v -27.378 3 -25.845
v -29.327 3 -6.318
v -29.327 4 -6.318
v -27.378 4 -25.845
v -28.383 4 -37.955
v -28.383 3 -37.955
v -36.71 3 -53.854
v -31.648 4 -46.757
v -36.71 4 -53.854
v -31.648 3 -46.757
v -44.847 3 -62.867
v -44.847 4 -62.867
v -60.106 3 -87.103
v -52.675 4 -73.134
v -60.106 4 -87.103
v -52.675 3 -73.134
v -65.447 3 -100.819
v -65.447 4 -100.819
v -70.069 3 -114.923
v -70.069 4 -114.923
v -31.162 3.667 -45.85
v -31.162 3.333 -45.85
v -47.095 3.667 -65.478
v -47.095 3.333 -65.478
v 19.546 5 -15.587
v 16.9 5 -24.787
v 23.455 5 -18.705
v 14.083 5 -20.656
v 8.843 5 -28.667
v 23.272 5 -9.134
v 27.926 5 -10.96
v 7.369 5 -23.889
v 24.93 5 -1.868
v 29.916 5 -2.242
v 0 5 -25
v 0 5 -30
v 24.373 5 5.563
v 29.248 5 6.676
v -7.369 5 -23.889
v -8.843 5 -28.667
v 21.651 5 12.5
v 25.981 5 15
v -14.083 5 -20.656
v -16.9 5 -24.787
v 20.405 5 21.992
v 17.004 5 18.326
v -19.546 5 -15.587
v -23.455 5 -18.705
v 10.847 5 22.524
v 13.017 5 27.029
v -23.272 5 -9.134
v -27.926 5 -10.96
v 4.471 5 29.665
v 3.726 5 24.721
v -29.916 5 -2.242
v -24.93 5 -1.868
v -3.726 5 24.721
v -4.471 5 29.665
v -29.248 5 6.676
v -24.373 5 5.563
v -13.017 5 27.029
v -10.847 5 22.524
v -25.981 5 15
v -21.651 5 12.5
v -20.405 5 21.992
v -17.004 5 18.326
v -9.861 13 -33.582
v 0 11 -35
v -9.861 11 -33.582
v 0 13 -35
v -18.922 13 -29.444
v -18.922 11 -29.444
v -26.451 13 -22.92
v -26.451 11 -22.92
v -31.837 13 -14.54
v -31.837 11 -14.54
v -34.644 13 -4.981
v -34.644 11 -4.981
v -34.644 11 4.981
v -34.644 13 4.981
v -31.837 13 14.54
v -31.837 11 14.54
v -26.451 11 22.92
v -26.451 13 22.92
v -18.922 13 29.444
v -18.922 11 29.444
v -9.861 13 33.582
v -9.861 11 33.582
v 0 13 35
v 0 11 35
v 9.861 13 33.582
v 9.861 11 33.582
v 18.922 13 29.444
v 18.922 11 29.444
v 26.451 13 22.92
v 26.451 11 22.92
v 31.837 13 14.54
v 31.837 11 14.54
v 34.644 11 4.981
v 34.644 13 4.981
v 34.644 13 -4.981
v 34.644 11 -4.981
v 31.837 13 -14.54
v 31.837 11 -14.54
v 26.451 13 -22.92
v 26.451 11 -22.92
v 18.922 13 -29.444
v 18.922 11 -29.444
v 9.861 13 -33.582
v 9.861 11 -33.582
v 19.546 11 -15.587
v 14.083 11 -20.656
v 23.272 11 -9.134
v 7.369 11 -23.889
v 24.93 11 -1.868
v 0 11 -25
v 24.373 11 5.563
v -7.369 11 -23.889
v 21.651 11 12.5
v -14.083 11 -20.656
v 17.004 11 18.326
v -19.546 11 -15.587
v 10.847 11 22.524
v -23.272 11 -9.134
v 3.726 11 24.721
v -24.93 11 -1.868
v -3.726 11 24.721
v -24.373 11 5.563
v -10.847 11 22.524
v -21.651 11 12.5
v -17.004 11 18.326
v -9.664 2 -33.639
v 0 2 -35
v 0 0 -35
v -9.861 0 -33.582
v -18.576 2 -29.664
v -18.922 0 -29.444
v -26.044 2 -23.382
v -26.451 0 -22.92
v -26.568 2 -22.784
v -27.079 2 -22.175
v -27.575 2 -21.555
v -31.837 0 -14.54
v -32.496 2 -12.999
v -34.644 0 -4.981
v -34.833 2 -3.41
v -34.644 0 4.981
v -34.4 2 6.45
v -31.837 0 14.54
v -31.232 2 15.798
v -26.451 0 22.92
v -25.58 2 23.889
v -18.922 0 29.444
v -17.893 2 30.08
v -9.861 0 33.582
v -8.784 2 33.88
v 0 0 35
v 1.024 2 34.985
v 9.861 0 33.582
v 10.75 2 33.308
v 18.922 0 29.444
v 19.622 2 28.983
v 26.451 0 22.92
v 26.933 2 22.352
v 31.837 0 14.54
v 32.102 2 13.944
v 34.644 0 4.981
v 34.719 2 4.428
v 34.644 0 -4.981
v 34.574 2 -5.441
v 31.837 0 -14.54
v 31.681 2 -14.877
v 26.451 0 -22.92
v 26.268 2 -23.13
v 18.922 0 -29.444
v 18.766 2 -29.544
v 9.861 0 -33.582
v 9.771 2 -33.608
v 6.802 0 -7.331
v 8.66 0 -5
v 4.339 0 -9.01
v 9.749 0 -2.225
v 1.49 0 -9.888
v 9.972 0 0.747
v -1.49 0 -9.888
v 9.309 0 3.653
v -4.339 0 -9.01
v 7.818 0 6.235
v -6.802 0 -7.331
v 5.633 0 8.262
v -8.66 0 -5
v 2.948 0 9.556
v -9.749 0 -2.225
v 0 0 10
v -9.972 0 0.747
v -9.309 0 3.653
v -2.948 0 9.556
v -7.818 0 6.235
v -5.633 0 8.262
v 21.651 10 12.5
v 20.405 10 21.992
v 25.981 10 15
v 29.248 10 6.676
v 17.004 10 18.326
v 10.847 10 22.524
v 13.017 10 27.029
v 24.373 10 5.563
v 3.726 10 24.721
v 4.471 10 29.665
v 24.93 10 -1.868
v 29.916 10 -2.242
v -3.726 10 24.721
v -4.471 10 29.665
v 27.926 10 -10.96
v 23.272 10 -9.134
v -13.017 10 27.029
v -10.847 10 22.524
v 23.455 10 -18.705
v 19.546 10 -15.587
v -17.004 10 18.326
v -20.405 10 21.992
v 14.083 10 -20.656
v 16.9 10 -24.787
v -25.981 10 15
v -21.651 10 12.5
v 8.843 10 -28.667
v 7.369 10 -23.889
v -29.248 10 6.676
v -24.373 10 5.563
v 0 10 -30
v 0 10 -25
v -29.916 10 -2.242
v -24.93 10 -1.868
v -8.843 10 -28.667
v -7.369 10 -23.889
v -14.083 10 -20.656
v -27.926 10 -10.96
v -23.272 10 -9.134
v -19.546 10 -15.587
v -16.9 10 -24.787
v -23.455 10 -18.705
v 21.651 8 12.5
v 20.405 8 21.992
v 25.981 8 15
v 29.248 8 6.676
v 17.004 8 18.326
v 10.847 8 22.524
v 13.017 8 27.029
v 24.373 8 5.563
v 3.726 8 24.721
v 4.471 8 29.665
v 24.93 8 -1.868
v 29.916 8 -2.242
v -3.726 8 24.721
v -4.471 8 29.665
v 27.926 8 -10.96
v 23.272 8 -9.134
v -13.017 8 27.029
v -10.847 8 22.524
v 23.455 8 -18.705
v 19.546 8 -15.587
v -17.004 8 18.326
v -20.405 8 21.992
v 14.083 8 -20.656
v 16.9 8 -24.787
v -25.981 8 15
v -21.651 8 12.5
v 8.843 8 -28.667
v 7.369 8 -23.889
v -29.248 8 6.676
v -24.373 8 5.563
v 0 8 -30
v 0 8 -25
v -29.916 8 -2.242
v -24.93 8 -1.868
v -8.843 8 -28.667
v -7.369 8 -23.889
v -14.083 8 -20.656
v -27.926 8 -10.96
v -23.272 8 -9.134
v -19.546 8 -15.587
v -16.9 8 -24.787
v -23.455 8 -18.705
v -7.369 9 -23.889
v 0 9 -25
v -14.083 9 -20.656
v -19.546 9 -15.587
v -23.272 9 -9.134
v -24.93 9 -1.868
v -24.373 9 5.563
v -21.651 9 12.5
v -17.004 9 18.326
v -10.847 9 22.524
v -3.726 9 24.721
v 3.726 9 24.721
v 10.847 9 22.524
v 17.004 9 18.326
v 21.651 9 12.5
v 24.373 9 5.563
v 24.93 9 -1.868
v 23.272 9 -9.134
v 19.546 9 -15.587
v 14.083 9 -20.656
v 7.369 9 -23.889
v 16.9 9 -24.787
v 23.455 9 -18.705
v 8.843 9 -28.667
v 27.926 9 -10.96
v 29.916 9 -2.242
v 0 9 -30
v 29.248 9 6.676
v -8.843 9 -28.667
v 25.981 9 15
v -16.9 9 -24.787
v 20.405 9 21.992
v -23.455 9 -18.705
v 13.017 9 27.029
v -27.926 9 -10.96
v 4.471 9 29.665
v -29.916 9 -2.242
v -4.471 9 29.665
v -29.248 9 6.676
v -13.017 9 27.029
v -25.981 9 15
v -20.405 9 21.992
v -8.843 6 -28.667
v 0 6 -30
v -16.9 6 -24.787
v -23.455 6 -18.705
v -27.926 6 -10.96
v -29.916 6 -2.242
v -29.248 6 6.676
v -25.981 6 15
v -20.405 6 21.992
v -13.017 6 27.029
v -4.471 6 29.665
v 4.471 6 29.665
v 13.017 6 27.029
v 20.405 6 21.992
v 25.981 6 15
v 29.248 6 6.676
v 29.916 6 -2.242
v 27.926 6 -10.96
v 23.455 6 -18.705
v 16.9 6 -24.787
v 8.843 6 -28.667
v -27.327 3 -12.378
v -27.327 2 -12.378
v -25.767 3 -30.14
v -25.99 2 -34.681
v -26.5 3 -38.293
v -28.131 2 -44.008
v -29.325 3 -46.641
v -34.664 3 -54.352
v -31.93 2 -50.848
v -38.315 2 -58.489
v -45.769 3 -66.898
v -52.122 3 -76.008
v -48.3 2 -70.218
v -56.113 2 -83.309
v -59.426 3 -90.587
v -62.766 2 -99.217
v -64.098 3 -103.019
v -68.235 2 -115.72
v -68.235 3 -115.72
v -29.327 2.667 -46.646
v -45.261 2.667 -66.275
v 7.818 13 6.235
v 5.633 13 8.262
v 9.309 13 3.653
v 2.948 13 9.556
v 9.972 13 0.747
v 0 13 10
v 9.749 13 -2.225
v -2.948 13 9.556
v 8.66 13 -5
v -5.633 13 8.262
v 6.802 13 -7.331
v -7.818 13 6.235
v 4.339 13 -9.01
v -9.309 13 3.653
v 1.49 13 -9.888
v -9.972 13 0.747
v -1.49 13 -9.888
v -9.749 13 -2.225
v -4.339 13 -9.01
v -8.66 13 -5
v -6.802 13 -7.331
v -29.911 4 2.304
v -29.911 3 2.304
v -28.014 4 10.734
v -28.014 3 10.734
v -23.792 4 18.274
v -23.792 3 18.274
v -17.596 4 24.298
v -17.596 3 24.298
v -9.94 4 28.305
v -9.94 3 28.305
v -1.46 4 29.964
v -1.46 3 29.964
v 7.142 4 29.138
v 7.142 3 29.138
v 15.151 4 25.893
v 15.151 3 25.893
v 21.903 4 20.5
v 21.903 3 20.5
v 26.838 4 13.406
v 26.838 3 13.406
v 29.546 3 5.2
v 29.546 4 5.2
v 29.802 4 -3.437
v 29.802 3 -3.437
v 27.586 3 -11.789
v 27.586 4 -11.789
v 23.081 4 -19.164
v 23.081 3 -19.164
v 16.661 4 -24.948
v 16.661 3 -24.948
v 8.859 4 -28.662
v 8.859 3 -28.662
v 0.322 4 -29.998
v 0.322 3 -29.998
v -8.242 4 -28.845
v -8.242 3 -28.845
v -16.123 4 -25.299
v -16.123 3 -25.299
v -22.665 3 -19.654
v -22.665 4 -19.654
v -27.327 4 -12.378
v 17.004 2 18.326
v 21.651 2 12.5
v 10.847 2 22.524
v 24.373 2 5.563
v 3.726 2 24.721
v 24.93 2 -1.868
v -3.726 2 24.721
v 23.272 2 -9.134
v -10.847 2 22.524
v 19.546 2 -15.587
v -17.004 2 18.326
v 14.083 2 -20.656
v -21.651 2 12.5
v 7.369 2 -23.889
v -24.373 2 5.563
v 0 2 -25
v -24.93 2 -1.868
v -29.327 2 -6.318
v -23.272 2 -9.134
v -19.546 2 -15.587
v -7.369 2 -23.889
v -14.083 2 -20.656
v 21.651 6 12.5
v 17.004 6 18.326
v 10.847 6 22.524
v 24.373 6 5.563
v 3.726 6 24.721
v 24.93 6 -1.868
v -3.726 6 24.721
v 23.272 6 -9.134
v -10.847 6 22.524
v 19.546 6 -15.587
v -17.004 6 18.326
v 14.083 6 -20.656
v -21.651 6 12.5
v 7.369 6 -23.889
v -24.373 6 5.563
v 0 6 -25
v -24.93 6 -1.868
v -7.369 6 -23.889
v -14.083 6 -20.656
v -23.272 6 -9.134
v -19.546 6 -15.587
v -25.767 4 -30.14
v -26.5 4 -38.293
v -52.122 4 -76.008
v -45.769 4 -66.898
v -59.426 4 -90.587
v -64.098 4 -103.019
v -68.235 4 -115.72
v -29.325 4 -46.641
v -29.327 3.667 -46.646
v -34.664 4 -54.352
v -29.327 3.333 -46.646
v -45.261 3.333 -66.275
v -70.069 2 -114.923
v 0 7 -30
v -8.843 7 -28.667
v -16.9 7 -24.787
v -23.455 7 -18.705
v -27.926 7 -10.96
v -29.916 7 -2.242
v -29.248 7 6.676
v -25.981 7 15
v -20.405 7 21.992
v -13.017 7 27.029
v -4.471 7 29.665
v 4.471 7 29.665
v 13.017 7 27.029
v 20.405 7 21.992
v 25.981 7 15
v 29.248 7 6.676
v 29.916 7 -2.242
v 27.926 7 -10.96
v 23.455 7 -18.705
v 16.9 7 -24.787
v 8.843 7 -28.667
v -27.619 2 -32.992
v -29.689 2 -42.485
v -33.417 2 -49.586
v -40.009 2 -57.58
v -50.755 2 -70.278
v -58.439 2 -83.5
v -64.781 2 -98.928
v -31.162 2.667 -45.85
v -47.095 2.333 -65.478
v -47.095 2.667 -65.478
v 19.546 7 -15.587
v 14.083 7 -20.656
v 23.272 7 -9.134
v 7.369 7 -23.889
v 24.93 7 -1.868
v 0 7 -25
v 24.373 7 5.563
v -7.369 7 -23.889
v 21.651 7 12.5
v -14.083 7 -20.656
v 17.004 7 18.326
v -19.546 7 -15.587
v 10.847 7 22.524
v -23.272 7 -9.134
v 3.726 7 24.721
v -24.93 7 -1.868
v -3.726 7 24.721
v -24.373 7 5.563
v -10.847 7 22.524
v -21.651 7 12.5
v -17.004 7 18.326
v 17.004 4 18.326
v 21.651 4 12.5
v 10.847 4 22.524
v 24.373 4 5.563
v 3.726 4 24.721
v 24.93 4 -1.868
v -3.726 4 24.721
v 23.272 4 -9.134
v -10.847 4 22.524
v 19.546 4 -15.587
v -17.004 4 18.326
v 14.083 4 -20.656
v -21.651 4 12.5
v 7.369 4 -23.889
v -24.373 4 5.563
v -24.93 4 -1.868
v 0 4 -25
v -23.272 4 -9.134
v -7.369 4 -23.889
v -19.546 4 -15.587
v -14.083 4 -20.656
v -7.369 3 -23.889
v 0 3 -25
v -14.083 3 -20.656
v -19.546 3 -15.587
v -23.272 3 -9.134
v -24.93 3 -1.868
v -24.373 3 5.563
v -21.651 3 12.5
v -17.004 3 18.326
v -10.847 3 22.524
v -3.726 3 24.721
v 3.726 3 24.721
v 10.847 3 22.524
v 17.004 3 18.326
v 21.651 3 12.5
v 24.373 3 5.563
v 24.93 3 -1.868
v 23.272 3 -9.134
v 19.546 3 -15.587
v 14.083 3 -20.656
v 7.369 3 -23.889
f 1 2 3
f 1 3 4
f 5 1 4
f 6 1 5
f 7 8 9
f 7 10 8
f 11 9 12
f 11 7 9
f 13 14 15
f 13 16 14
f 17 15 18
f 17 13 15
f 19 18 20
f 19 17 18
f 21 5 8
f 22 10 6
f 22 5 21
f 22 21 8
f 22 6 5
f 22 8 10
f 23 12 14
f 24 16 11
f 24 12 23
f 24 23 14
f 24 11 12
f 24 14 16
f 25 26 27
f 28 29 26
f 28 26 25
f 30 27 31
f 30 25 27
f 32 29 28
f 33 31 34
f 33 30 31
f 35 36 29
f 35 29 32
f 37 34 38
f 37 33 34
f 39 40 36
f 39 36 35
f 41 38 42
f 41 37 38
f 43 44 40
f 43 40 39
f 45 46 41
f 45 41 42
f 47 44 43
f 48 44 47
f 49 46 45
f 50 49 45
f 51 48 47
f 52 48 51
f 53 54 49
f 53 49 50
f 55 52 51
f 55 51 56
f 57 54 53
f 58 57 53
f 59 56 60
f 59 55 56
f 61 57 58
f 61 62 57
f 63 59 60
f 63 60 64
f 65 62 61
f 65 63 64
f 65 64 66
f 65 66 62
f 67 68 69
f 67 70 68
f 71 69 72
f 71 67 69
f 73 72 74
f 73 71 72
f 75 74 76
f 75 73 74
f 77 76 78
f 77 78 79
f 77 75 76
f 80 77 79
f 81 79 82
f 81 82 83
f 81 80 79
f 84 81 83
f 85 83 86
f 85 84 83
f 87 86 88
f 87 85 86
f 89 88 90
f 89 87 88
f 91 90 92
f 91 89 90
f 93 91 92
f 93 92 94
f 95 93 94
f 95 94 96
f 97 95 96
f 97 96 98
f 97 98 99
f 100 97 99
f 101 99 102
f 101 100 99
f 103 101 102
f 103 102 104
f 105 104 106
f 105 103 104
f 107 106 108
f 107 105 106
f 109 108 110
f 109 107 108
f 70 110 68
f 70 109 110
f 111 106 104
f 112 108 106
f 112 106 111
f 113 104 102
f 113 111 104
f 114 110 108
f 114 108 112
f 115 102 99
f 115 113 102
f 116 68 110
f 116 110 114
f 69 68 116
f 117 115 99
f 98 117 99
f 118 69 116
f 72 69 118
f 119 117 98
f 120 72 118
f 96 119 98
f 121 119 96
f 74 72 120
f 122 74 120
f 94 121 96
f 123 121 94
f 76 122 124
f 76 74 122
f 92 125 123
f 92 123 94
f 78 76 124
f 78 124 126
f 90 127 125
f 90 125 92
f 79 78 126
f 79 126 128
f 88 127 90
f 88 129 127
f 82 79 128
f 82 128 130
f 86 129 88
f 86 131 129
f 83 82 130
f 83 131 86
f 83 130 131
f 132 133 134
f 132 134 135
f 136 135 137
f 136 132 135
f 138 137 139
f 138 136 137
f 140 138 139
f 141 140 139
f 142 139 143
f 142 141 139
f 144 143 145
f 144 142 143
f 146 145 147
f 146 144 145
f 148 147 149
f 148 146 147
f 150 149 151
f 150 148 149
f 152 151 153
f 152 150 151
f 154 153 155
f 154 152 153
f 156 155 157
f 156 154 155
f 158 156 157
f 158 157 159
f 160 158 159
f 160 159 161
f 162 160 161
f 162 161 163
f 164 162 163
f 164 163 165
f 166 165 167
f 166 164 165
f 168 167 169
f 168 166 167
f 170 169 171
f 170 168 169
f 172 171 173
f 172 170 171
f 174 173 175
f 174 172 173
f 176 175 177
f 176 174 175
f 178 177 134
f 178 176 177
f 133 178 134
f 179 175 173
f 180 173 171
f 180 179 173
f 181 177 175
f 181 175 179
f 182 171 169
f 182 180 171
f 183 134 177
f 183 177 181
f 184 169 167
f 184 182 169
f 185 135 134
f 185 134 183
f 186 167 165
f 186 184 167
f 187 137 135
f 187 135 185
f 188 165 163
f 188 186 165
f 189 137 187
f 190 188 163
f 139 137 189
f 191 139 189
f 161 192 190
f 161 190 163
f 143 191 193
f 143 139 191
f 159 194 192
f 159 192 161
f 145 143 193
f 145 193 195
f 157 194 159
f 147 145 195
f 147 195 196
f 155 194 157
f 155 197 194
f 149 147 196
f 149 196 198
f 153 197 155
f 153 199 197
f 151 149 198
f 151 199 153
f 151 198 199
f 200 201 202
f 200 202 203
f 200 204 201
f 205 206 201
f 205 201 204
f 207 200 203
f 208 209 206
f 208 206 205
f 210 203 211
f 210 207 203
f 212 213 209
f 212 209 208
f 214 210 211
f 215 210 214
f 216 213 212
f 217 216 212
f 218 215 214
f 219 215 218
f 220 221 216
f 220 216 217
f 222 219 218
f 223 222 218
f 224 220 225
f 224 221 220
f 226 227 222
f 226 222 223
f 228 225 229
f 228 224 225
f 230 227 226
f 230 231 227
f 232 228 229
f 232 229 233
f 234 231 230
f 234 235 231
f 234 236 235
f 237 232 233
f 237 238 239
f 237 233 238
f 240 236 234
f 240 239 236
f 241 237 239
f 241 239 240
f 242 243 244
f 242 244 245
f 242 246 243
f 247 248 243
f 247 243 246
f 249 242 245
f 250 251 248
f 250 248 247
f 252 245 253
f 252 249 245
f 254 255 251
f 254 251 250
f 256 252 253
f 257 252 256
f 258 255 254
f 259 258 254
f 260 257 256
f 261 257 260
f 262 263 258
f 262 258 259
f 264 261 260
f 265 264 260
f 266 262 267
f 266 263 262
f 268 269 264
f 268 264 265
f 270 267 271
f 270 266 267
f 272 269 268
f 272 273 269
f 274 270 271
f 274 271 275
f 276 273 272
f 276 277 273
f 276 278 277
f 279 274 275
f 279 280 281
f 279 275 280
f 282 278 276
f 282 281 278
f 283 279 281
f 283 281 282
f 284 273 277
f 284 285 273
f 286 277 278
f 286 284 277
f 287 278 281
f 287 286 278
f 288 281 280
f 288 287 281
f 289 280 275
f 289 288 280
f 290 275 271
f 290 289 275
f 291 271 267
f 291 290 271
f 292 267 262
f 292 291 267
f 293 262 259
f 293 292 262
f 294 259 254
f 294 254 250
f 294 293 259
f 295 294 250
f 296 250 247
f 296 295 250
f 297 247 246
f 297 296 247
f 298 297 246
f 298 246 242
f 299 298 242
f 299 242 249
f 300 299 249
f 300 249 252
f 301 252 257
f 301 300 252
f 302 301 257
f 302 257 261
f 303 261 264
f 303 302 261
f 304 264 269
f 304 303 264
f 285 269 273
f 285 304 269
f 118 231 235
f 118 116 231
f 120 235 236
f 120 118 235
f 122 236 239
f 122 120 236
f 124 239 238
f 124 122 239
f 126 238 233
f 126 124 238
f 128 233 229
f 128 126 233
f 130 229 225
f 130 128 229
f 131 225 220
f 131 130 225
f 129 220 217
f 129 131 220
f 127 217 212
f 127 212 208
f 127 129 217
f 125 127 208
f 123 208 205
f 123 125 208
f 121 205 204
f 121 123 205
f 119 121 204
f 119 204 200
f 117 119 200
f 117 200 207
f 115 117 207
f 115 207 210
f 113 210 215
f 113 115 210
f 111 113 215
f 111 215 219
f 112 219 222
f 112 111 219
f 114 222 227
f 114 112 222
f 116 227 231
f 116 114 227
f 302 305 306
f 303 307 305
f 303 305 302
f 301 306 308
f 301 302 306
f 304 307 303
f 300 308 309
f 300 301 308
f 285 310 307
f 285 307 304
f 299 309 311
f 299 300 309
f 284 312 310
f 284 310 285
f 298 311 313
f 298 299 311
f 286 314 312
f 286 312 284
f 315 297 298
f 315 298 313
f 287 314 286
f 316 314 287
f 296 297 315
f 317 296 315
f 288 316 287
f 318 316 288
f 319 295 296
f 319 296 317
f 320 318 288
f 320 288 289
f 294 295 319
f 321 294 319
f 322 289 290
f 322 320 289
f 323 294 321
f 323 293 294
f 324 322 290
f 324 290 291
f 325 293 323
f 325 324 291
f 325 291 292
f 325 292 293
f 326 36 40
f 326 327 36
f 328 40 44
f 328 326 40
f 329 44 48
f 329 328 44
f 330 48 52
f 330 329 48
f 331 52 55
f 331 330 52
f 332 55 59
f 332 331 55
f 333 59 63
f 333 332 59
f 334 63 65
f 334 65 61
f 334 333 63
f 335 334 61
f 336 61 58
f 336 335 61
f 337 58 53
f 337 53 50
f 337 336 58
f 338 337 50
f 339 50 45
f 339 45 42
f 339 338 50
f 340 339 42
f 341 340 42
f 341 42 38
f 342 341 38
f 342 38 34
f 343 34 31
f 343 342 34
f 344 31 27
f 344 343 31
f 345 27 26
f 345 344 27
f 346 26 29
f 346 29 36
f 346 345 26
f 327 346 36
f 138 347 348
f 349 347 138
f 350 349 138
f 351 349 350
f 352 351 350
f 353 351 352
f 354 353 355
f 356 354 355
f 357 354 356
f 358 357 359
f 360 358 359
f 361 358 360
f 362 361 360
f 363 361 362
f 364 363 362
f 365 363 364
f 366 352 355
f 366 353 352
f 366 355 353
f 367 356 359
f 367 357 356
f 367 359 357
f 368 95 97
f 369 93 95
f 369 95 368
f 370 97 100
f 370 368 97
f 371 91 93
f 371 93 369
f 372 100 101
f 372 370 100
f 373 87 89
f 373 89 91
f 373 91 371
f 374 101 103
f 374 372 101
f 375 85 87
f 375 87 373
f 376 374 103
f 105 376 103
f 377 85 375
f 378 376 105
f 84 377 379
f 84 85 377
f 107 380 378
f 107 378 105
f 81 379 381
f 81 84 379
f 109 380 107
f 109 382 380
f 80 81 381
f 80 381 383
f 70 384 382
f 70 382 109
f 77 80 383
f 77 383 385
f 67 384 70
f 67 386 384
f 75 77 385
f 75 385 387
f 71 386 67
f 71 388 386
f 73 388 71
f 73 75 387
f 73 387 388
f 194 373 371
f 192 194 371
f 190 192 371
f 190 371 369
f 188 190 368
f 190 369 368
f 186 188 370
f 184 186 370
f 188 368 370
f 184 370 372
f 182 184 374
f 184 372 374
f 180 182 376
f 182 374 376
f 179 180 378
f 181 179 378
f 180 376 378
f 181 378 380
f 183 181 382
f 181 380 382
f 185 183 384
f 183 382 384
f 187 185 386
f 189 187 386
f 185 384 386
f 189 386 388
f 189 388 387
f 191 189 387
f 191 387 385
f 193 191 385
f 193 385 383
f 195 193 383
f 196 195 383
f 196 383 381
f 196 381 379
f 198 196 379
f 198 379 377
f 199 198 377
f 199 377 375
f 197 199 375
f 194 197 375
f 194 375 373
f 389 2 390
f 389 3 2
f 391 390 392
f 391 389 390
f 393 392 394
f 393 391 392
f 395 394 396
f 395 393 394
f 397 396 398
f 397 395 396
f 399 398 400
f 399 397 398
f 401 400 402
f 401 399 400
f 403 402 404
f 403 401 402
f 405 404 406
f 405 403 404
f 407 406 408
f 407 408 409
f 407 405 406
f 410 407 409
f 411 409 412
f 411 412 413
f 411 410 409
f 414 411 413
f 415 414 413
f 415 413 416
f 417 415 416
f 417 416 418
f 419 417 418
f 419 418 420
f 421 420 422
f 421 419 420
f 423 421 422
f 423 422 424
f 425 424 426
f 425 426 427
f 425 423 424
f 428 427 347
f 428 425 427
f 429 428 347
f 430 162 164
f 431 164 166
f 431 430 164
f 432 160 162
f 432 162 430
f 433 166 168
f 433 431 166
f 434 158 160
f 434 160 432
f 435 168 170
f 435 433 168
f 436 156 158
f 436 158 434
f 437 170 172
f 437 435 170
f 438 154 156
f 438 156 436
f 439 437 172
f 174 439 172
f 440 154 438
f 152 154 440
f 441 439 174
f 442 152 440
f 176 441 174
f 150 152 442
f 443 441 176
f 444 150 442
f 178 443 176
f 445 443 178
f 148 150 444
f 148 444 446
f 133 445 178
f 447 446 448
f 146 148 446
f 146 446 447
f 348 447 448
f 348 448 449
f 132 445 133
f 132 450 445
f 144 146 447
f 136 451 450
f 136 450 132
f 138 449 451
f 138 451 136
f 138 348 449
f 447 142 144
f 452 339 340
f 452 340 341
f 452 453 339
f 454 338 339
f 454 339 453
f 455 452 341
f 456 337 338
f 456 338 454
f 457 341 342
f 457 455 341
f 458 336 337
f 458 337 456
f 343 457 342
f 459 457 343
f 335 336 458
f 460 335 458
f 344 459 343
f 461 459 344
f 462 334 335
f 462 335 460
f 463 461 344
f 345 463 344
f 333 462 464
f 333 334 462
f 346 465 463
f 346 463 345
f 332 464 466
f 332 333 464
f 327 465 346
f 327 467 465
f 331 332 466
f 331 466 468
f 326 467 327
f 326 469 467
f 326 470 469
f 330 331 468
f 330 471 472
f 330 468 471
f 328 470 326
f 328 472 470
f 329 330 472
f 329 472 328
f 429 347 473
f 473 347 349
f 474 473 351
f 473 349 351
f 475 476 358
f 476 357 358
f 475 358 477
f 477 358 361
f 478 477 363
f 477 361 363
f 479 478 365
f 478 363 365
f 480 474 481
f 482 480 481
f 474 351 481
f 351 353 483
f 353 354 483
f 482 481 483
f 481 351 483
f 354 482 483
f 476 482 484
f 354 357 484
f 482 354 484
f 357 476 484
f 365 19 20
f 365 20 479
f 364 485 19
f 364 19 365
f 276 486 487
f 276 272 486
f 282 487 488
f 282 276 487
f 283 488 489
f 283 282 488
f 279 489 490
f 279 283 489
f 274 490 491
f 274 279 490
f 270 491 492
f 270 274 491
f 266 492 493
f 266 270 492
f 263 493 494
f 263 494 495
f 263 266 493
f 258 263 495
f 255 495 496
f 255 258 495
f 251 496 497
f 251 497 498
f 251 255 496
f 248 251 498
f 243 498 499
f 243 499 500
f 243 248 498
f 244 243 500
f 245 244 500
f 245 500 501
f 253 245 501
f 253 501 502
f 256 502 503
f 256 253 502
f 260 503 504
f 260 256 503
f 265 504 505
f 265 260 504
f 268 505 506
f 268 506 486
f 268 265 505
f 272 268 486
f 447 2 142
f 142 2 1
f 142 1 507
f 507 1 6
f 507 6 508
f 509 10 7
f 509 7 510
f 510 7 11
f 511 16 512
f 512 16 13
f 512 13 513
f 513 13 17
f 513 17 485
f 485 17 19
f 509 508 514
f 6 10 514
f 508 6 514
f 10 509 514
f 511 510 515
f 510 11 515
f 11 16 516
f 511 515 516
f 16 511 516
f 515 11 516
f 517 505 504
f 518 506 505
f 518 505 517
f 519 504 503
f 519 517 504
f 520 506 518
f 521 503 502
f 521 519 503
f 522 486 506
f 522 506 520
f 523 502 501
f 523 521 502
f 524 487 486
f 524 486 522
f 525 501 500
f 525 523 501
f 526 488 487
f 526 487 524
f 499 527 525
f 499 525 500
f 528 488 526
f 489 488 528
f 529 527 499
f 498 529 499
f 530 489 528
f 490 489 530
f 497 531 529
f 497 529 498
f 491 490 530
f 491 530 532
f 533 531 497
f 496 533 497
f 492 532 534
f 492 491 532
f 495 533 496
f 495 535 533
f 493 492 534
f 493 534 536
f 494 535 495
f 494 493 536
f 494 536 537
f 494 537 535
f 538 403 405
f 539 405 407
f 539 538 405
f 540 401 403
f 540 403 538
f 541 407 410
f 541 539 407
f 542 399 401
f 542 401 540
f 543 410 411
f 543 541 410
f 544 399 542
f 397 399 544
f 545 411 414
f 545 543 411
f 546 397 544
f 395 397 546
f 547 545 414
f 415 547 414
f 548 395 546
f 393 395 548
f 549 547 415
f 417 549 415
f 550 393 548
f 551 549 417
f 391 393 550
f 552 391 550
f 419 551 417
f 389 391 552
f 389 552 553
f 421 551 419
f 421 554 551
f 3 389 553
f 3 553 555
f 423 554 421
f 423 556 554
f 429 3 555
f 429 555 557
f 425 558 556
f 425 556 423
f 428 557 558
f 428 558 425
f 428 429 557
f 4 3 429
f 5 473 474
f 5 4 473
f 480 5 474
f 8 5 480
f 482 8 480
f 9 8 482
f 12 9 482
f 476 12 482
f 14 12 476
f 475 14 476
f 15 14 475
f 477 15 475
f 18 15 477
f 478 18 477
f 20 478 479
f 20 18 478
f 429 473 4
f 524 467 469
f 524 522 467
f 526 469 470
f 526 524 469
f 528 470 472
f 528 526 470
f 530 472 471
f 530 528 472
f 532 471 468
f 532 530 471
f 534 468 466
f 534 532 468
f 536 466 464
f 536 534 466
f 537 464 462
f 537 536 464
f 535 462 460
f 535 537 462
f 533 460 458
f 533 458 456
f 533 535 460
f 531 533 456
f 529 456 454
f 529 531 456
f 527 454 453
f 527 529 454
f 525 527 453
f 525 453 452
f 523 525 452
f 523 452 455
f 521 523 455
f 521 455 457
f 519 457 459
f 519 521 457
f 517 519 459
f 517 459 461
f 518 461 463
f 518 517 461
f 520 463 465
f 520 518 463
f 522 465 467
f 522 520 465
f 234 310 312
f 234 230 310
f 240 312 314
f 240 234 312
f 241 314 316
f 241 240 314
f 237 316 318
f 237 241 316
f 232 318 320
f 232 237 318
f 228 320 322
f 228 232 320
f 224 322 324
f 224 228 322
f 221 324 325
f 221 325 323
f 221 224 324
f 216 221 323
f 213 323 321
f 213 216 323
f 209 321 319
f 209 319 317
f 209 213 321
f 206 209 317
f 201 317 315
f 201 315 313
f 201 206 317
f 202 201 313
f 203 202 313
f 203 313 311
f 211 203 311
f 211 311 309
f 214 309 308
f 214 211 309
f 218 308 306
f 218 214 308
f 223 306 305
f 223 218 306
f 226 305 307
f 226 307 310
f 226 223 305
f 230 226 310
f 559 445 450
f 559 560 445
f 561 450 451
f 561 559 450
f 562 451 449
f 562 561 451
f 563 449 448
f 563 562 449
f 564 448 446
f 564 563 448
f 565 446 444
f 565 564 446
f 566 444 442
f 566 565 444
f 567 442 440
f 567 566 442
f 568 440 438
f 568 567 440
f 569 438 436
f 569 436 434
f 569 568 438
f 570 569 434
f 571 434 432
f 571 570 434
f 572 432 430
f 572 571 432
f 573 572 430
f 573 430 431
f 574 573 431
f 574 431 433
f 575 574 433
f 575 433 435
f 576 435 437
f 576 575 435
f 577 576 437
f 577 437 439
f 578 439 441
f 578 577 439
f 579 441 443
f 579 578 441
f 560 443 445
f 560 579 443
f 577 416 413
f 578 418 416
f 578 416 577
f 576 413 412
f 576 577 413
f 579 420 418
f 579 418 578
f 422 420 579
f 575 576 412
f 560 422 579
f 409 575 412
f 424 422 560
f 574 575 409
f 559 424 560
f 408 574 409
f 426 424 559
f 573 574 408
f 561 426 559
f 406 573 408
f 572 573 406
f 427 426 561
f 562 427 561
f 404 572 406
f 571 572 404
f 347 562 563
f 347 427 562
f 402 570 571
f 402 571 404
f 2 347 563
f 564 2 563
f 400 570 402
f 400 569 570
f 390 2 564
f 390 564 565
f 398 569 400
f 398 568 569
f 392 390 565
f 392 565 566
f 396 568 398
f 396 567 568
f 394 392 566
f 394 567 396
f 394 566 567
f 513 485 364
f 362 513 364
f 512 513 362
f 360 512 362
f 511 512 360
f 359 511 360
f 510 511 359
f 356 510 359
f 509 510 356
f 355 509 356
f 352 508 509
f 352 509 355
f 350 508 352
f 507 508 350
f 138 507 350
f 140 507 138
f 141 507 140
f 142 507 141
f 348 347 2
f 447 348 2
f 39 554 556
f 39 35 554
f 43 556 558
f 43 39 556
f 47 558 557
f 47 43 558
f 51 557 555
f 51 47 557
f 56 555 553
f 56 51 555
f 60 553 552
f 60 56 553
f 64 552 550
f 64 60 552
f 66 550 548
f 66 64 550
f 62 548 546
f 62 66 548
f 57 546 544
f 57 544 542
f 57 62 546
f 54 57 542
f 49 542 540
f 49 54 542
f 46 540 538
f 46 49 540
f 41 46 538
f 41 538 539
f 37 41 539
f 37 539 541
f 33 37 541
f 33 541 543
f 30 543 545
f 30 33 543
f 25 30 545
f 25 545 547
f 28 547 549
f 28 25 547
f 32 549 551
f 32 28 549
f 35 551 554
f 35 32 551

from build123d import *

# Parameters (mm, degrees)
LINEAR_AUSTRAGEN1_DEPTH      = 1
LINEAR_AUSTRAGEN1_DEPTH_BACK = 1
SKIZZE6_R                    = 10
LINEAR_AUSTRAGEN2_DEPTH      = 14


with BuildPart() as part:
    # Skizze2 → Rotation1 (revolve)
    with BuildSketch(Plane.XY, mode=Mode.PRIVATE) as rotation1_sk:
        Polygon((0, 0), (35, 0), (35, 2), (25, 2), (25, 3), (30, 3), (30, 4), (25, 4), (25, 5), (30, 5), (30, 6), (25, 6), (25, 7), (30, 7), (30, 8), (25, 8), (25, 9), (30, 9), (30, 10), (25, 10), (25, 11), (35, 11), (35, 13), (0, 13), align=None)
    revolve(rotation1_sk.sketch.rotate(Axis((0, 0, 0), (0, 1, 0)), 90), axis=Axis((0, 0, 0), (0, 1, 0)))  # turned: the seam where the file's is

    # Skizze5 → Linear austragen1 (add, two sides)
    with BuildSketch(Plane.XZ.offset(-3)) as linear_austragen1_sk:
        with BuildLine():
            Line((-27.327200212, -12.378373422), (-29.327200212, -6.317857842))
            add(Edge.make_bspline(
                [(-29.327200212, -6.317857842), (-27.376461725, -20.505117436), (-24.179519663, -43.75572085), (-56.295044405, -71.57330883), (-64.478459695, -97.327806995), (-70.069385578, -114.923332251)],
                knots=[0, 0, 0, 0, 0.331505275, 0.543283051, 1, 1, 1, 1], degree=3))
            Line((-70.069385578, -114.923332251), (-68.234927057, -115.720051735))
            add(Edge.make_bspline(
                [(-27.327200212, -12.378373422), (-25.584010264, -25.096675338), (-23.311002372, -45.18830878), (-54.519049761, -72.525658101), (-62.667731325, -98.187695715), (-68.234927057, -115.720051735)],
                knots=[0, 0, 0, 0, 0.308292386, 0.527423959, 1, 1, 1, 1], degree=3))
        make_face()
    extrude(amount=LINEAR_AUSTRAGEN1_DEPTH)
    extrude(linear_austragen1_sk.sketch, amount=-LINEAR_AUSTRAGEN1_DEPTH_BACK)

    # Skizze6 → Linear austragen2 (cut, through all)
    with BuildSketch(Plane(origin=(0, 13, 0), x_dir=(1, 0, 0), z_dir=(0, 1, 0))):
        with Locations(Location((0, 0, 0), (0, 0, 270))):  # turned: the seam where the file's is
            Circle(SKIZZE6_R)
    extrude(amount=-LINEAR_AUSTRAGEN2_DEPTH, mode=Mode.SUBTRACT)


solid = part.part
